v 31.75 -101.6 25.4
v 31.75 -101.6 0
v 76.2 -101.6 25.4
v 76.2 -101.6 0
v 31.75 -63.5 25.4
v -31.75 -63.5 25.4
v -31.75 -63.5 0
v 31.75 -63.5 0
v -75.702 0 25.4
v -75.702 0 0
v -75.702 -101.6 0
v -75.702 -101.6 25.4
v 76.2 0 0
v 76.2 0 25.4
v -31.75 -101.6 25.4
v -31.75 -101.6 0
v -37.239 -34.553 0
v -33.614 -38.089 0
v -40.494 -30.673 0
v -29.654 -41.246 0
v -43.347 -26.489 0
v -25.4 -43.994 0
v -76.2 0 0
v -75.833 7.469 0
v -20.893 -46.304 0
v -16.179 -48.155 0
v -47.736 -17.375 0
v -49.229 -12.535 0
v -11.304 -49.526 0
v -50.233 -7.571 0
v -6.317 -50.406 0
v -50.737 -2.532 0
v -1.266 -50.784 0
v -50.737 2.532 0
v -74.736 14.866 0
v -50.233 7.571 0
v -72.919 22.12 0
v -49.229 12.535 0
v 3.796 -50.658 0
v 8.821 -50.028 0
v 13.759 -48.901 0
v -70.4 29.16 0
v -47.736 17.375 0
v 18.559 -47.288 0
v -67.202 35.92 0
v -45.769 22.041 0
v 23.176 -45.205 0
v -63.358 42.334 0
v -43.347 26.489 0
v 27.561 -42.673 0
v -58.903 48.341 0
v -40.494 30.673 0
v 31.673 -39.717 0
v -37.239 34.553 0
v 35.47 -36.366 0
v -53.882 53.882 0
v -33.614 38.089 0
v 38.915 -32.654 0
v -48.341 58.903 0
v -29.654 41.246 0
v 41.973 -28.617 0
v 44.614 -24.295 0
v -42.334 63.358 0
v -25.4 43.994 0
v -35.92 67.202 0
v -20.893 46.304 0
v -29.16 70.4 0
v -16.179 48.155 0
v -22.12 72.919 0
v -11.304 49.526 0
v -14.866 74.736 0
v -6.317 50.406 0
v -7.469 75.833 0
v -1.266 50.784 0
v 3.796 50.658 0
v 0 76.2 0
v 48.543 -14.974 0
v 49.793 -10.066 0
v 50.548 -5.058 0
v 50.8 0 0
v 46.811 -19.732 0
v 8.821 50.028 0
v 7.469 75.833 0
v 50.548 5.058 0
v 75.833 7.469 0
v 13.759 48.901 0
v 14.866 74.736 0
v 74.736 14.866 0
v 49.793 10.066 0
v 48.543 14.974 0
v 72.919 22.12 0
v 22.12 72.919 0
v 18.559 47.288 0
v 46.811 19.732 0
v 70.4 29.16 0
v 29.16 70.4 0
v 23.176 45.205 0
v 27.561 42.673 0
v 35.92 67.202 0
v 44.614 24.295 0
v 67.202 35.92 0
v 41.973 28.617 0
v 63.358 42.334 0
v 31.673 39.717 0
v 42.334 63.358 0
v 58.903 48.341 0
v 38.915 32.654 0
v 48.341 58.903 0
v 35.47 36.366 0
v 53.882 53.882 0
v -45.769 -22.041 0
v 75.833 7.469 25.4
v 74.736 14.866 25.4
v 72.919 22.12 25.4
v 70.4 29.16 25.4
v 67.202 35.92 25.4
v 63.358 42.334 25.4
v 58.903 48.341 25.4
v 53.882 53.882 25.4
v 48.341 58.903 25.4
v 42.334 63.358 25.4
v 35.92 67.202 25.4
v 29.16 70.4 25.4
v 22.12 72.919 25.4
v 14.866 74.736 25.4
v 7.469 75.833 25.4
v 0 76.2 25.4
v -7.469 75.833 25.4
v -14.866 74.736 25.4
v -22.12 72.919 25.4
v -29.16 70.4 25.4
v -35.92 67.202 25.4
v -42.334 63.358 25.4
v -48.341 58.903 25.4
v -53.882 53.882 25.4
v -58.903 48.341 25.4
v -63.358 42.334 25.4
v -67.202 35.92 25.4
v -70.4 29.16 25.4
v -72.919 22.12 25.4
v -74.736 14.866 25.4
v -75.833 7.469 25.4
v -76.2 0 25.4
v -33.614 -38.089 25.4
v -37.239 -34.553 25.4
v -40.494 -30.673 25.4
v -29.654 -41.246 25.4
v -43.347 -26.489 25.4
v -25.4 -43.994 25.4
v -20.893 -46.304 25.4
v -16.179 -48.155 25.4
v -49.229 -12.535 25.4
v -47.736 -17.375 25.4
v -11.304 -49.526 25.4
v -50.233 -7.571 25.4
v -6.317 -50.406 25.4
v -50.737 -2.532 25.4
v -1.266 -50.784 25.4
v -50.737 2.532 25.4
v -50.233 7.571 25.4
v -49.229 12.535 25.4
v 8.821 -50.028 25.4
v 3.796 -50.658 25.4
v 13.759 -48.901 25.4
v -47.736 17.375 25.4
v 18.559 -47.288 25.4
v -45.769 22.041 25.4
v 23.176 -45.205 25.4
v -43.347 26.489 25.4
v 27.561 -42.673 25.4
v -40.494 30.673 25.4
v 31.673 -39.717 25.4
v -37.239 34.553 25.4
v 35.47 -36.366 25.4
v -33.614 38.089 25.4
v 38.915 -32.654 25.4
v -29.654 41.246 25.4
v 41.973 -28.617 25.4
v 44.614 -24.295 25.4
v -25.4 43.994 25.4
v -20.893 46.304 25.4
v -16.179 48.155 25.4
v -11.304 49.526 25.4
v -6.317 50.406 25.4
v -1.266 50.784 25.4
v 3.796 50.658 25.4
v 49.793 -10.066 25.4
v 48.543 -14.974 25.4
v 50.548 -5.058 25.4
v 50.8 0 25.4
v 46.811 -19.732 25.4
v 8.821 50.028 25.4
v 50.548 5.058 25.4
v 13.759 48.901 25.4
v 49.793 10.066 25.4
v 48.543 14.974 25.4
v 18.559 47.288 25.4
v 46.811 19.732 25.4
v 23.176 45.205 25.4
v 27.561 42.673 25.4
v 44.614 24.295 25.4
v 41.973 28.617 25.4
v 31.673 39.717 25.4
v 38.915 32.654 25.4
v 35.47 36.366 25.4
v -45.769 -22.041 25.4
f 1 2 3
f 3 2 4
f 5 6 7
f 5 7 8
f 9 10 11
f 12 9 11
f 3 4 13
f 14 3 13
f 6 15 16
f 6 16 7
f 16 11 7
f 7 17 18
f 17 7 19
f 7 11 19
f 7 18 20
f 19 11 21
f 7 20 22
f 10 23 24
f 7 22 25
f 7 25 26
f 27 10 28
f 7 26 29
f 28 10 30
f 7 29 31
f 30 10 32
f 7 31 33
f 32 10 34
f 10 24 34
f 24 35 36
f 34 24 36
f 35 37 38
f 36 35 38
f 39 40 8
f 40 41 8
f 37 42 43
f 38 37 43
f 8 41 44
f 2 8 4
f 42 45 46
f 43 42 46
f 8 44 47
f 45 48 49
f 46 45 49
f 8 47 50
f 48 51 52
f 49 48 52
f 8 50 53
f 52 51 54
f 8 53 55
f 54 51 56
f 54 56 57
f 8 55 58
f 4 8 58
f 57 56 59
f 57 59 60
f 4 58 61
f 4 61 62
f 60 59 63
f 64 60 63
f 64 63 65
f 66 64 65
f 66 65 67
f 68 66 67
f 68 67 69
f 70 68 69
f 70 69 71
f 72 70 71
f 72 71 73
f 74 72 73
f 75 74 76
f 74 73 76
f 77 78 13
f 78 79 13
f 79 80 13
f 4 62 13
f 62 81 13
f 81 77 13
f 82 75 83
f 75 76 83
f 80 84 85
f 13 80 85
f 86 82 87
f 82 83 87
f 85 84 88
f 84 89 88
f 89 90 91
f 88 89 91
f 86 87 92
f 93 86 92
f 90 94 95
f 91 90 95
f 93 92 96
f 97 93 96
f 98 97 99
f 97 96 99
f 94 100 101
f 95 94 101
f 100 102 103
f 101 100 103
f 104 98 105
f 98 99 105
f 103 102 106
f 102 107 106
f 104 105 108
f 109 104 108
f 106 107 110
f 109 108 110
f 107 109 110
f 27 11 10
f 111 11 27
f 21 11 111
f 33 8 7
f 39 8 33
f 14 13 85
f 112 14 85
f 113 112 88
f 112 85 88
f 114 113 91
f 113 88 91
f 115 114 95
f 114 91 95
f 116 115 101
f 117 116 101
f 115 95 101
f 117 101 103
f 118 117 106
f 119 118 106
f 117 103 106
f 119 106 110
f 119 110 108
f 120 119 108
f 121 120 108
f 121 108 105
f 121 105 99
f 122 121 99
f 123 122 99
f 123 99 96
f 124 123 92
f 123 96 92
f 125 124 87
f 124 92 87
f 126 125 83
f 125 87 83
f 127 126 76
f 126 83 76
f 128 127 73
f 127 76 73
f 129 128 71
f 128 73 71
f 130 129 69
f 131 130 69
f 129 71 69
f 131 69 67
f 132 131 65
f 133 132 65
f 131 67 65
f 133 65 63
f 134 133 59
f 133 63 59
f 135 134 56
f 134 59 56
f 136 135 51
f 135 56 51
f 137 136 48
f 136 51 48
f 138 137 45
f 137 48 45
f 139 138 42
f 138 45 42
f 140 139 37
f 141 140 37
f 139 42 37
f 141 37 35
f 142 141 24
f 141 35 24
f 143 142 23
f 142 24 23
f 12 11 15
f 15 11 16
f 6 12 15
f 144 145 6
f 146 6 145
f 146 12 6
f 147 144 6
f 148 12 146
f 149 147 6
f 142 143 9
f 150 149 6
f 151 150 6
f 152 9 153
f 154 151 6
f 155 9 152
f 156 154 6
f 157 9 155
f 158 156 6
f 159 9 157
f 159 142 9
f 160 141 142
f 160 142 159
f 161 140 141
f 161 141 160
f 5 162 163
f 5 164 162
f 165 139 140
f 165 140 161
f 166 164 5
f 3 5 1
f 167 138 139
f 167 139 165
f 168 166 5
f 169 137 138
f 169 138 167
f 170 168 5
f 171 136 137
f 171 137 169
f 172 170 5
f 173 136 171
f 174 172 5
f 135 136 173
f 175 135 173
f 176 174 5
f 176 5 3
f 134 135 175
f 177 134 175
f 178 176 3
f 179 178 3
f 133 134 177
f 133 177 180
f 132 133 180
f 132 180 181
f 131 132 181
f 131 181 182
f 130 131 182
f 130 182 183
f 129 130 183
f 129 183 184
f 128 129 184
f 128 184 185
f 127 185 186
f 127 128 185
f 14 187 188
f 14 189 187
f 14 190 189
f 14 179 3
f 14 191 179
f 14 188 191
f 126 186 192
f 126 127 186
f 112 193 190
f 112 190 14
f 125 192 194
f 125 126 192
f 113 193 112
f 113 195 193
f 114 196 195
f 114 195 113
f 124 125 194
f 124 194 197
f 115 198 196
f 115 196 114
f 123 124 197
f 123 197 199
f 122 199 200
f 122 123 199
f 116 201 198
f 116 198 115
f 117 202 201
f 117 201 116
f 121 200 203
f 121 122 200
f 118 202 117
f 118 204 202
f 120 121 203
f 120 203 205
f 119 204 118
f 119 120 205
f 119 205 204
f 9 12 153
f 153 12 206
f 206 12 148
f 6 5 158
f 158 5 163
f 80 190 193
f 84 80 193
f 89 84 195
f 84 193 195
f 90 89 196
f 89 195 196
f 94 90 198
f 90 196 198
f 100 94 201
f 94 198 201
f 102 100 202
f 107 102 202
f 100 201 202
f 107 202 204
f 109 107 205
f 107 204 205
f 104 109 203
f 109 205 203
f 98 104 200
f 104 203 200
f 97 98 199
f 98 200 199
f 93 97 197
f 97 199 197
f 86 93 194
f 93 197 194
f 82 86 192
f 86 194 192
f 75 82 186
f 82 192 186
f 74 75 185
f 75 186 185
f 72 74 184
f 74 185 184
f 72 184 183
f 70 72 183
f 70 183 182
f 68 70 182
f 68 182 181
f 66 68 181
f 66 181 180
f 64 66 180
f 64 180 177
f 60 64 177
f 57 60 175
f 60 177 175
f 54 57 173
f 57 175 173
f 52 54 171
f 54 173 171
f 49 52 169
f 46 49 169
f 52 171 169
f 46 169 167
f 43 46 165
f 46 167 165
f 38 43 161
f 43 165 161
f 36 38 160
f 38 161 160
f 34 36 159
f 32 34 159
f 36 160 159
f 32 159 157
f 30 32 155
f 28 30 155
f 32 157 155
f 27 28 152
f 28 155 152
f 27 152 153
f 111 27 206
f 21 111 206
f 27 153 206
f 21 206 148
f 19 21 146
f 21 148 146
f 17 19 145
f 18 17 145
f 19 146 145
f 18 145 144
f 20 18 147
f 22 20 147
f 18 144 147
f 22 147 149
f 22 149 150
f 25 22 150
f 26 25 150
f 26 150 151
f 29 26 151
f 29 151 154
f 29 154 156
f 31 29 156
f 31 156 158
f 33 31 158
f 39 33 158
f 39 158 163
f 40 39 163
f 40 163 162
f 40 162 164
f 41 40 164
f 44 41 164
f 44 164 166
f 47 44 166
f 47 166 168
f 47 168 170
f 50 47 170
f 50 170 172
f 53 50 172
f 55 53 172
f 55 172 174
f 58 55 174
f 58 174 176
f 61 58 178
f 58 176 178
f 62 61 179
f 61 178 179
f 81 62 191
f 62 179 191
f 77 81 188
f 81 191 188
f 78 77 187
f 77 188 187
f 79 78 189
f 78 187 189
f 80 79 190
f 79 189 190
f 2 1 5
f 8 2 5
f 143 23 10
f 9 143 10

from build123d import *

# Parameters (mm, degrees)
F1_DEPTH = 25.4
F2_R     = 50.8
F3_DEPTH = 25.4
F4_W     = 63.5
F4_H     = 38.1
F5_DEPTH = 25.4


with BuildPart() as f1:
    # F0 (on Top) → F1 (new body)
    with BuildSketch(Plane.XY):
        with BuildLine():
            Line((-75.701751, 0), (76.2, 0))
            ThreePointArc((76.2, 0), (0, 76.2), (-76.2, 0))
            Line((-76.2, 0), (-75.701751, 0))
        make_face()
        with BuildLine():
            ThreePointArc((-75.701751, -8.699708), (4.356982, -76.075336), (76.2, 0))
            Line((76.2, 0), (-75.701751, 0))
            Line((-75.701751, 0), (-75.701751, -8.699708))
        make_face()
        with BuildLine():
            Line((76.2, -101.6), (76.2, 0))
            ThreePointArc((76.2, 0), (4.356982, -76.075336), (-75.701751, -8.699708))
            Line((-75.701751, -8.699708), (-75.701751, -101.6))
            Line((-75.701751, -101.6), (76.2, -101.6))
        make_face()
    extrude(amount=F1_DEPTH)

    # F2 (on face) → F3 (cut)
    with BuildSketch(Plane.XY.offset(25.4)):
        Circle(F2_R)
    extrude(amount=-F3_DEPTH, mode=Mode.SUBTRACT)

    # F4 (on face) → F5 (cut)
    with BuildSketch(Plane.XY.offset(25.4)):
        with Locations((0, -82.55)):
            Rectangle(F4_W, F4_H)
    extrude(amount=-F5_DEPTH, mode=Mode.SUBTRACT)


solid = f1.part
